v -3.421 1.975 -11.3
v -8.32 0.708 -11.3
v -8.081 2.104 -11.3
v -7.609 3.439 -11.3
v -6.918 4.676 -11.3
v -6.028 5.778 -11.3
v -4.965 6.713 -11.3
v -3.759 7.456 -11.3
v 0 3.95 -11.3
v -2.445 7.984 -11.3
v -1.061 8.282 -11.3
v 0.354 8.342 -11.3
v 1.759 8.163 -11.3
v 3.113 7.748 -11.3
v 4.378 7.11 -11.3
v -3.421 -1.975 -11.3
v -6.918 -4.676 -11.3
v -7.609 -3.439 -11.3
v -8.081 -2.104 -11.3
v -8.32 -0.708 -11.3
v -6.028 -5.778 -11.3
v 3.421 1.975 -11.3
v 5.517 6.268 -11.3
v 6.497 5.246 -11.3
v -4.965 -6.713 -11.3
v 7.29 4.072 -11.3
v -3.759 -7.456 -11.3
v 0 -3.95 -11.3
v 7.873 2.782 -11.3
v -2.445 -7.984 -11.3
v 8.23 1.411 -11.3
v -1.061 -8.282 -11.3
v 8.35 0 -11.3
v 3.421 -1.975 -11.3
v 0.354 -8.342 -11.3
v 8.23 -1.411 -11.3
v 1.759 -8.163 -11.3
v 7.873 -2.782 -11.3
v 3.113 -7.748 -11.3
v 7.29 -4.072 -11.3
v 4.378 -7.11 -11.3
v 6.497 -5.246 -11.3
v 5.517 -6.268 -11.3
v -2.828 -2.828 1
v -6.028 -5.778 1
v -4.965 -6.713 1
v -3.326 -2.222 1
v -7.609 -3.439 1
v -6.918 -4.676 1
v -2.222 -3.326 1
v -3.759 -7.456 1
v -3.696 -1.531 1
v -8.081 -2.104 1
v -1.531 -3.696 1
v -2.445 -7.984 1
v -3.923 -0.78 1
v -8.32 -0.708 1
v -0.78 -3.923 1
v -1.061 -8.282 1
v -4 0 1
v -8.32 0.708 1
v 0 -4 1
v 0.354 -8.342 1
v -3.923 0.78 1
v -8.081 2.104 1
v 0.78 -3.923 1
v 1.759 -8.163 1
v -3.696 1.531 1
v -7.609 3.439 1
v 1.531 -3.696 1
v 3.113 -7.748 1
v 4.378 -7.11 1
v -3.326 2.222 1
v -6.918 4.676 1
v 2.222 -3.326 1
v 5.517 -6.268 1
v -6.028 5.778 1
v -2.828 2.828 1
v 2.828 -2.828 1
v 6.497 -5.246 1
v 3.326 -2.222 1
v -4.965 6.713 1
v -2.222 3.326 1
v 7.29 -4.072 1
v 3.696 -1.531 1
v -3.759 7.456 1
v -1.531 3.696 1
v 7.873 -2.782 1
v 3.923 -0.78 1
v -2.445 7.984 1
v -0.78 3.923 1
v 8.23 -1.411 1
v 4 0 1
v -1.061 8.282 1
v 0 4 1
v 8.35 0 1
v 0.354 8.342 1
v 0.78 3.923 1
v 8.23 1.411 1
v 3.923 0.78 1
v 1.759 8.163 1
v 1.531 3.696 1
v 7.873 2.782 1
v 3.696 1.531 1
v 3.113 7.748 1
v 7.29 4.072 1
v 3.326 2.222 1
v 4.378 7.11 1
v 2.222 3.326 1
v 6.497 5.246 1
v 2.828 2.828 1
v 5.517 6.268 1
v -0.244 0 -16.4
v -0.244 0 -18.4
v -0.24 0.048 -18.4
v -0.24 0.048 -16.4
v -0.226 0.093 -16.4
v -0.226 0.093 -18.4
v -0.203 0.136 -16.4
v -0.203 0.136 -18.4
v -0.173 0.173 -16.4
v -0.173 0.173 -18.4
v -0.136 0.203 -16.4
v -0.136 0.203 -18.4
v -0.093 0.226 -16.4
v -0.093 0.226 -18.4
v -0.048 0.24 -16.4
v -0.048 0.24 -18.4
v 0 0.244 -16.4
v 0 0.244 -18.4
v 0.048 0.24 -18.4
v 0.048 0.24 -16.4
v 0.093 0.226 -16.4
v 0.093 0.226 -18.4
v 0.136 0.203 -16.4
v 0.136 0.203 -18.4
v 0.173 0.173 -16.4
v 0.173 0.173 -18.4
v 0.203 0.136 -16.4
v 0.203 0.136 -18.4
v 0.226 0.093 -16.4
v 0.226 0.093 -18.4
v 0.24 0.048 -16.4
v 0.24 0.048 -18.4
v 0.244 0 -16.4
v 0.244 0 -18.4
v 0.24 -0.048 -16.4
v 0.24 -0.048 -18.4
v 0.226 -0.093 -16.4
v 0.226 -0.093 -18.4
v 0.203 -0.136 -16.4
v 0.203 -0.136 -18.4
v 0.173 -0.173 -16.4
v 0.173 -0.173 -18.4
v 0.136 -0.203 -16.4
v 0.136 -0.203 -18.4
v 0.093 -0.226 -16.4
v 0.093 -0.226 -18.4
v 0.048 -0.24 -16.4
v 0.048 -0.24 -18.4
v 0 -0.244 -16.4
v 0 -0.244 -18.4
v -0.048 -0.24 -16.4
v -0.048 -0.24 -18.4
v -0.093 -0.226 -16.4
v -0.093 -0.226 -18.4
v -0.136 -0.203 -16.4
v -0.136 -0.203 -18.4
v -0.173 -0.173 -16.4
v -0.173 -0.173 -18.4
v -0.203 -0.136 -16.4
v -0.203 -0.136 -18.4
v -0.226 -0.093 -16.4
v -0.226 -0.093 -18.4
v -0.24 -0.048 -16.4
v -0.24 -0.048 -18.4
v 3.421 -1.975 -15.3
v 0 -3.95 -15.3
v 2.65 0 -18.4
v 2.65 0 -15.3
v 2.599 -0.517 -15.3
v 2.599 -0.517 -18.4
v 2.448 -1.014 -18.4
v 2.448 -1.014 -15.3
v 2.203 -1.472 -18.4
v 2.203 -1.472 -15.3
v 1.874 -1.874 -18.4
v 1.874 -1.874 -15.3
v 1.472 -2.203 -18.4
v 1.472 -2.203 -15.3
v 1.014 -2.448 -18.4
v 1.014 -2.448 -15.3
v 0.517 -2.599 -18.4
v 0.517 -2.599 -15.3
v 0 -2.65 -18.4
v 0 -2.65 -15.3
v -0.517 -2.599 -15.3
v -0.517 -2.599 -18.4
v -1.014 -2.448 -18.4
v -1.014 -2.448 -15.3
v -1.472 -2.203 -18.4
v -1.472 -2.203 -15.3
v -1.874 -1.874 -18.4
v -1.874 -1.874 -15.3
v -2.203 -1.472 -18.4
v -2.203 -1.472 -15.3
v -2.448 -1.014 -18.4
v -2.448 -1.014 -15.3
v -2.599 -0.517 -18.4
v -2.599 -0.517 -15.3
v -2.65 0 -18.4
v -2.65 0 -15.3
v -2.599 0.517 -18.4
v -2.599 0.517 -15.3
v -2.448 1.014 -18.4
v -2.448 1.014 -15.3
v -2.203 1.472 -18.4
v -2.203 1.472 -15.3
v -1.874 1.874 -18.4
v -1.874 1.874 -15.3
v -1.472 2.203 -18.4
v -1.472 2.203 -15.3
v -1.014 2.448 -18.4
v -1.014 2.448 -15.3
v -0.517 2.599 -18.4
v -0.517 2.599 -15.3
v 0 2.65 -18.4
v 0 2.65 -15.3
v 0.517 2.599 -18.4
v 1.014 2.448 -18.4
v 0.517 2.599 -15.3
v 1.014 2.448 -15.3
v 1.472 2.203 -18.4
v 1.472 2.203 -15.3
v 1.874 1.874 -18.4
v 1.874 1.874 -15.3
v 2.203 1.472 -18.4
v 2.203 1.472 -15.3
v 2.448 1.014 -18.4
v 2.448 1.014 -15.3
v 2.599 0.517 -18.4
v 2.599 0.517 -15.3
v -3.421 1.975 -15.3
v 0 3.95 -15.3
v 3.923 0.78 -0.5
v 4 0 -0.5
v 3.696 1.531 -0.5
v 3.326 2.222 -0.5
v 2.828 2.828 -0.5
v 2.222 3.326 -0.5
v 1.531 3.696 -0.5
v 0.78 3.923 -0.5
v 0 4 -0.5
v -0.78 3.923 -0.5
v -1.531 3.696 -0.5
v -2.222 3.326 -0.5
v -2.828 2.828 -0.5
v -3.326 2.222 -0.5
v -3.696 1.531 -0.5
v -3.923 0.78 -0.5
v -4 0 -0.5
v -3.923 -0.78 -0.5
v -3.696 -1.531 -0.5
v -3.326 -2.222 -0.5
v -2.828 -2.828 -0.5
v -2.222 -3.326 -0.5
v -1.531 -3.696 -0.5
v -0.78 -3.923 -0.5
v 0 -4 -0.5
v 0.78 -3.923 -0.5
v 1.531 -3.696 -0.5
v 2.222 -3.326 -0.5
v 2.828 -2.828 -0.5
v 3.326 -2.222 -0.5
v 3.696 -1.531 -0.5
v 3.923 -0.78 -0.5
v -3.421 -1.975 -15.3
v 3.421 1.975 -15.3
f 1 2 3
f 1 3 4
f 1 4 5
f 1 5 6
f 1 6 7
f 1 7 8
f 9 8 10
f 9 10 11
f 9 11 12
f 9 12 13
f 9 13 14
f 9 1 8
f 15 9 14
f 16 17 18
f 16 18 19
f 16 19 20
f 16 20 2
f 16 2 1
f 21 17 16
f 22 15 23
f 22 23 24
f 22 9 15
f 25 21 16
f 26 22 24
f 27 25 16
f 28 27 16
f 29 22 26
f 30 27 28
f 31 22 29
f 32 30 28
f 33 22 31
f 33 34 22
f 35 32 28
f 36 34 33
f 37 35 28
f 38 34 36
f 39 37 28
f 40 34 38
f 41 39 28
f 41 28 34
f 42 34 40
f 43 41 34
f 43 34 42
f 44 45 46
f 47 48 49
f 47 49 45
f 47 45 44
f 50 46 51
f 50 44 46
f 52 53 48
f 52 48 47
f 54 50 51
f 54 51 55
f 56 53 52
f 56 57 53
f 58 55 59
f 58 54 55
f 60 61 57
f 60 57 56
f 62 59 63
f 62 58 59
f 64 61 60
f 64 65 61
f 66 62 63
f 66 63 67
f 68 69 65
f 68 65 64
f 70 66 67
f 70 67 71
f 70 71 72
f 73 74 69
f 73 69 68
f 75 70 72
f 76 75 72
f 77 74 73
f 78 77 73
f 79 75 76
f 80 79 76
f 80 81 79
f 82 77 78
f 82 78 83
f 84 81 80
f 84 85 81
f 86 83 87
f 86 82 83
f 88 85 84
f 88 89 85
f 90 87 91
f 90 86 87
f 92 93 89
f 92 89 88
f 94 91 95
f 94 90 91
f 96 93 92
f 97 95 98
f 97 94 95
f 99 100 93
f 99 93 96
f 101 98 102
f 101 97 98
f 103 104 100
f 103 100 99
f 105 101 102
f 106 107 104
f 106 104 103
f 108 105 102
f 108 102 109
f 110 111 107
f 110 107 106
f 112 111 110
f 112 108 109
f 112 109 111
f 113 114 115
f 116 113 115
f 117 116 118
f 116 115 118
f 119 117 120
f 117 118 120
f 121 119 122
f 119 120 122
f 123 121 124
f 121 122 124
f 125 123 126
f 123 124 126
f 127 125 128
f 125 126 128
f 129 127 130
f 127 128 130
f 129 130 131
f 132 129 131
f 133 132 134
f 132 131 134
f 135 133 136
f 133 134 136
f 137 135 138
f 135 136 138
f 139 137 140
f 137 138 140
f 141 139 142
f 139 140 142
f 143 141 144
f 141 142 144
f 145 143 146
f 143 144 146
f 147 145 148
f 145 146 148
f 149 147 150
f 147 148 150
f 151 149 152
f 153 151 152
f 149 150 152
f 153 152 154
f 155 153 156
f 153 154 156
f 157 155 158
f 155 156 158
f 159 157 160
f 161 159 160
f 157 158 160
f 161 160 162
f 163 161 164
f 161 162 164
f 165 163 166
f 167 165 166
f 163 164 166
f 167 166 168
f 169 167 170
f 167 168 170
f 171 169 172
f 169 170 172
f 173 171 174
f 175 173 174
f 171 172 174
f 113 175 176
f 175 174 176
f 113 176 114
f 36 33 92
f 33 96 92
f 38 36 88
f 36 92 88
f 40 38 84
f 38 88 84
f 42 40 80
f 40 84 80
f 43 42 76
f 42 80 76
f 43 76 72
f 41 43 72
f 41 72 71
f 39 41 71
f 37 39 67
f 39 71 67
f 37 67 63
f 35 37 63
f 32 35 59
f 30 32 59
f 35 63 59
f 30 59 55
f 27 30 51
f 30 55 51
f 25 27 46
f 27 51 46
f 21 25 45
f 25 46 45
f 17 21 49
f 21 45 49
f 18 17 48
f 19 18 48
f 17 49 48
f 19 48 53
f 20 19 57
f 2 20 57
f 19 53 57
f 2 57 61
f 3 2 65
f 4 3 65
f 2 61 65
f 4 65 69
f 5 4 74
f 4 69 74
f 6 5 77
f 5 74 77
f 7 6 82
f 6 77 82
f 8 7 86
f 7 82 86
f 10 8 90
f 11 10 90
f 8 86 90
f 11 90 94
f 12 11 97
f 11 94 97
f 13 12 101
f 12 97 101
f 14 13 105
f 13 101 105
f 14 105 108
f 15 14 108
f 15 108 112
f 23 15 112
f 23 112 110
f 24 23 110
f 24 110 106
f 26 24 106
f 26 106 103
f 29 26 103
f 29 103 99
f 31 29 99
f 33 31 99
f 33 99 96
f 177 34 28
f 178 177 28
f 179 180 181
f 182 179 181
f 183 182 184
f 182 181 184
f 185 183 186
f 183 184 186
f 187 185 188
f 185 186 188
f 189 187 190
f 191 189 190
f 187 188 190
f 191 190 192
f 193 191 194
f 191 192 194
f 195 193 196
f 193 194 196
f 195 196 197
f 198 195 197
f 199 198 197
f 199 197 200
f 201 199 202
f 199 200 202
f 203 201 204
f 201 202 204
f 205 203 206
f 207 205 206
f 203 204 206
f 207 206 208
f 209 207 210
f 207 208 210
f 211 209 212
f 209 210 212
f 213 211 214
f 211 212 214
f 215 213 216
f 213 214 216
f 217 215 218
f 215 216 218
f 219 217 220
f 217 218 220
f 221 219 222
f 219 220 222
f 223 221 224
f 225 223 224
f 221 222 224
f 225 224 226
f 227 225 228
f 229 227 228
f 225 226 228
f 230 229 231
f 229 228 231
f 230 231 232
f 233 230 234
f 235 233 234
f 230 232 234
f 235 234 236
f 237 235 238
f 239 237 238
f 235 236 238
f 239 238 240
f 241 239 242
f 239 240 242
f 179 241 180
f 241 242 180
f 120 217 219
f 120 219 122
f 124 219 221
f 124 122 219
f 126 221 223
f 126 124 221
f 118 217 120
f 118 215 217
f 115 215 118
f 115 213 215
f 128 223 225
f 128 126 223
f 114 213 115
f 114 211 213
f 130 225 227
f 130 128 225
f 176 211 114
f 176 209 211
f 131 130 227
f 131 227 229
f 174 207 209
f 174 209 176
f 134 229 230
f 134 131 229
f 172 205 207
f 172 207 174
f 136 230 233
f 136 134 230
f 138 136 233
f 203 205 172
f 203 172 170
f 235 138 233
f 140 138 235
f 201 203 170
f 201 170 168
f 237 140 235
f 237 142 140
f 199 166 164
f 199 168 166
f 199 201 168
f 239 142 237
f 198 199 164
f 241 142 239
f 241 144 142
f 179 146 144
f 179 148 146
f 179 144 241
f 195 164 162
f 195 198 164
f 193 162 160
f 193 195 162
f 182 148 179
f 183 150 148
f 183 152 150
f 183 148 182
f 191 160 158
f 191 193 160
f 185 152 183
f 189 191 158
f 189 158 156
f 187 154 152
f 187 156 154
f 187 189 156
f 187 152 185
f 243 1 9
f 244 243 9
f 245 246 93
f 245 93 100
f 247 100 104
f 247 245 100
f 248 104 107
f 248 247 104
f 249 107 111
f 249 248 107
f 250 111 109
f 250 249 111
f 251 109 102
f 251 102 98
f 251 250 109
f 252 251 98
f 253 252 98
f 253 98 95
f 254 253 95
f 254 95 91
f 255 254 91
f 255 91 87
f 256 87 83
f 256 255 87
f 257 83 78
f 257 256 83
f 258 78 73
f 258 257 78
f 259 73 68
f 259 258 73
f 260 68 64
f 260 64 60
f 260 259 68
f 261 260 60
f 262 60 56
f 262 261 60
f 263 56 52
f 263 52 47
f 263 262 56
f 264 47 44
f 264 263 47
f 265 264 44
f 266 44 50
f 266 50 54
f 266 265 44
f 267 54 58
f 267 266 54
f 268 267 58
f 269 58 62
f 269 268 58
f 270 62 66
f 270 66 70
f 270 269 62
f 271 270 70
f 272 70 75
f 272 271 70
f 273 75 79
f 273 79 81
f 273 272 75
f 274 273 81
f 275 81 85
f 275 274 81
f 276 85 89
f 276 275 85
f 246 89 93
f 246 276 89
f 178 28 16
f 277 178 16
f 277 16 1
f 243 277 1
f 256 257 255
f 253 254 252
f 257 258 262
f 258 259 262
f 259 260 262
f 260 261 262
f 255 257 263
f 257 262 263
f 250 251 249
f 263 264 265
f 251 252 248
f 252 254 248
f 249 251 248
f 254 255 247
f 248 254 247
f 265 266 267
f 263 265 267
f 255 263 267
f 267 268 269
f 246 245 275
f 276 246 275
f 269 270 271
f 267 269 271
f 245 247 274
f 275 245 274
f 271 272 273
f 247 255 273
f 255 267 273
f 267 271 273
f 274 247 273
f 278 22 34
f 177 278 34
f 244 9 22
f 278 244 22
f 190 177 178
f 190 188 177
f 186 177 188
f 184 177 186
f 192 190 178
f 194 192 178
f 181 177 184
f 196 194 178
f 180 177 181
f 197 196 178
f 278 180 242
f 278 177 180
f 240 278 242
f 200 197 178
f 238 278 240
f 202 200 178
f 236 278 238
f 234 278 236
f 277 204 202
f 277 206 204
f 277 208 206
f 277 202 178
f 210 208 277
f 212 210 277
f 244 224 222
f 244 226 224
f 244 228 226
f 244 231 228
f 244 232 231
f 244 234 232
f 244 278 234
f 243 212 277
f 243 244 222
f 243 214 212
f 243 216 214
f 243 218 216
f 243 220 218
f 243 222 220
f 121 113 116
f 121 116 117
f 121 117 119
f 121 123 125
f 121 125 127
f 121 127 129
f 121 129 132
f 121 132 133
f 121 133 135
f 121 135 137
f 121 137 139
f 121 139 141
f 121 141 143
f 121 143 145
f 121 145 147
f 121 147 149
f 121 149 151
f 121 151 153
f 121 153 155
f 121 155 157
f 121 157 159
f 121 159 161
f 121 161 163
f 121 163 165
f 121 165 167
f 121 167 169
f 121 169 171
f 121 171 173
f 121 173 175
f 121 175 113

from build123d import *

# Parameters (mm, degrees)
BOSS_EXTRUDE1_DEPTH      = 1
BOSS_EXTRUDE1_DEPTH_BACK = 0.5
SKETCH3_R                = 8.35
SKETCH3_R_2              = 4
SKETCH4_R                = 8.35
BOSS_EXTRUDE2_DEPTH      = 10.8
BOSS_EXTRUDE4_DEPTH      = 4
SKETCH6_R                = 2.65
BOSS_EXTRUDE5_DEPTH      = 3.1
SKETCH7_R                = 0.244312337
CUT_EXTRUDE1_DEPTH       = 2


with BuildPart() as part:
    # Sketch3 → Boss-Extrude1 (new, two sides: drawn at the far end of the back side and taken through both)
    with BuildSketch(Plane.XY.offset(-BOSS_EXTRUDE1_DEPTH_BACK)):
        Circle(SKETCH3_R)
        Circle(SKETCH3_R_2, mode=Mode.SUBTRACT)
    extrude(amount=BOSS_EXTRUDE1_DEPTH + BOSS_EXTRUDE1_DEPTH_BACK)

    # Sketch4 → Boss-Extrude2 (add)
    with BuildSketch(Plane(origin=(0, 0, -0.5), x_dir=(-1, 0, 0), z_dir=(0, 0, -1))):
        with Locations(Location((0, 0, 0), (0, 0, 180))):
            Circle(SKETCH4_R)
    extrude(amount=BOSS_EXTRUDE2_DEPTH)

    # Sketch5 → Boss-Extrude4 (add)
    with BuildSketch(Plane(origin=(0, 0, -11.3), x_dir=(-1, 0, 0), z_dir=(0, 0, -1))):
        Polygon((0, 3.95), (-3.420800345, 1.975), (-3.420800345, -1.975), (0, -3.95), (3.420800345, -1.975), (3.420800345, 1.975), align=None)
    extrude(amount=BOSS_EXTRUDE4_DEPTH)

    # Sketch6 → Boss-Extrude5 (add)
    with BuildSketch(Plane(origin=(0, 0, -15.3), x_dir=(-1, 0, 0), z_dir=(0, 0, -1))):
        with Locations(Location((0, 0, 0), (0, 0, 180))):
            Circle(SKETCH6_R)
    extrude(amount=BOSS_EXTRUDE5_DEPTH)

    # Sketch7 → Cut-Extrude1 (cut)
    with BuildSketch(Plane(origin=(0, 0, -18.4), x_dir=(-1, 0, 0), z_dir=(0, 0, -1))):
        Circle(SKETCH7_R)
    extrude(amount=-CUT_EXTRUDE1_DEPTH, mode=Mode.SUBTRACT)


solid = part.part
